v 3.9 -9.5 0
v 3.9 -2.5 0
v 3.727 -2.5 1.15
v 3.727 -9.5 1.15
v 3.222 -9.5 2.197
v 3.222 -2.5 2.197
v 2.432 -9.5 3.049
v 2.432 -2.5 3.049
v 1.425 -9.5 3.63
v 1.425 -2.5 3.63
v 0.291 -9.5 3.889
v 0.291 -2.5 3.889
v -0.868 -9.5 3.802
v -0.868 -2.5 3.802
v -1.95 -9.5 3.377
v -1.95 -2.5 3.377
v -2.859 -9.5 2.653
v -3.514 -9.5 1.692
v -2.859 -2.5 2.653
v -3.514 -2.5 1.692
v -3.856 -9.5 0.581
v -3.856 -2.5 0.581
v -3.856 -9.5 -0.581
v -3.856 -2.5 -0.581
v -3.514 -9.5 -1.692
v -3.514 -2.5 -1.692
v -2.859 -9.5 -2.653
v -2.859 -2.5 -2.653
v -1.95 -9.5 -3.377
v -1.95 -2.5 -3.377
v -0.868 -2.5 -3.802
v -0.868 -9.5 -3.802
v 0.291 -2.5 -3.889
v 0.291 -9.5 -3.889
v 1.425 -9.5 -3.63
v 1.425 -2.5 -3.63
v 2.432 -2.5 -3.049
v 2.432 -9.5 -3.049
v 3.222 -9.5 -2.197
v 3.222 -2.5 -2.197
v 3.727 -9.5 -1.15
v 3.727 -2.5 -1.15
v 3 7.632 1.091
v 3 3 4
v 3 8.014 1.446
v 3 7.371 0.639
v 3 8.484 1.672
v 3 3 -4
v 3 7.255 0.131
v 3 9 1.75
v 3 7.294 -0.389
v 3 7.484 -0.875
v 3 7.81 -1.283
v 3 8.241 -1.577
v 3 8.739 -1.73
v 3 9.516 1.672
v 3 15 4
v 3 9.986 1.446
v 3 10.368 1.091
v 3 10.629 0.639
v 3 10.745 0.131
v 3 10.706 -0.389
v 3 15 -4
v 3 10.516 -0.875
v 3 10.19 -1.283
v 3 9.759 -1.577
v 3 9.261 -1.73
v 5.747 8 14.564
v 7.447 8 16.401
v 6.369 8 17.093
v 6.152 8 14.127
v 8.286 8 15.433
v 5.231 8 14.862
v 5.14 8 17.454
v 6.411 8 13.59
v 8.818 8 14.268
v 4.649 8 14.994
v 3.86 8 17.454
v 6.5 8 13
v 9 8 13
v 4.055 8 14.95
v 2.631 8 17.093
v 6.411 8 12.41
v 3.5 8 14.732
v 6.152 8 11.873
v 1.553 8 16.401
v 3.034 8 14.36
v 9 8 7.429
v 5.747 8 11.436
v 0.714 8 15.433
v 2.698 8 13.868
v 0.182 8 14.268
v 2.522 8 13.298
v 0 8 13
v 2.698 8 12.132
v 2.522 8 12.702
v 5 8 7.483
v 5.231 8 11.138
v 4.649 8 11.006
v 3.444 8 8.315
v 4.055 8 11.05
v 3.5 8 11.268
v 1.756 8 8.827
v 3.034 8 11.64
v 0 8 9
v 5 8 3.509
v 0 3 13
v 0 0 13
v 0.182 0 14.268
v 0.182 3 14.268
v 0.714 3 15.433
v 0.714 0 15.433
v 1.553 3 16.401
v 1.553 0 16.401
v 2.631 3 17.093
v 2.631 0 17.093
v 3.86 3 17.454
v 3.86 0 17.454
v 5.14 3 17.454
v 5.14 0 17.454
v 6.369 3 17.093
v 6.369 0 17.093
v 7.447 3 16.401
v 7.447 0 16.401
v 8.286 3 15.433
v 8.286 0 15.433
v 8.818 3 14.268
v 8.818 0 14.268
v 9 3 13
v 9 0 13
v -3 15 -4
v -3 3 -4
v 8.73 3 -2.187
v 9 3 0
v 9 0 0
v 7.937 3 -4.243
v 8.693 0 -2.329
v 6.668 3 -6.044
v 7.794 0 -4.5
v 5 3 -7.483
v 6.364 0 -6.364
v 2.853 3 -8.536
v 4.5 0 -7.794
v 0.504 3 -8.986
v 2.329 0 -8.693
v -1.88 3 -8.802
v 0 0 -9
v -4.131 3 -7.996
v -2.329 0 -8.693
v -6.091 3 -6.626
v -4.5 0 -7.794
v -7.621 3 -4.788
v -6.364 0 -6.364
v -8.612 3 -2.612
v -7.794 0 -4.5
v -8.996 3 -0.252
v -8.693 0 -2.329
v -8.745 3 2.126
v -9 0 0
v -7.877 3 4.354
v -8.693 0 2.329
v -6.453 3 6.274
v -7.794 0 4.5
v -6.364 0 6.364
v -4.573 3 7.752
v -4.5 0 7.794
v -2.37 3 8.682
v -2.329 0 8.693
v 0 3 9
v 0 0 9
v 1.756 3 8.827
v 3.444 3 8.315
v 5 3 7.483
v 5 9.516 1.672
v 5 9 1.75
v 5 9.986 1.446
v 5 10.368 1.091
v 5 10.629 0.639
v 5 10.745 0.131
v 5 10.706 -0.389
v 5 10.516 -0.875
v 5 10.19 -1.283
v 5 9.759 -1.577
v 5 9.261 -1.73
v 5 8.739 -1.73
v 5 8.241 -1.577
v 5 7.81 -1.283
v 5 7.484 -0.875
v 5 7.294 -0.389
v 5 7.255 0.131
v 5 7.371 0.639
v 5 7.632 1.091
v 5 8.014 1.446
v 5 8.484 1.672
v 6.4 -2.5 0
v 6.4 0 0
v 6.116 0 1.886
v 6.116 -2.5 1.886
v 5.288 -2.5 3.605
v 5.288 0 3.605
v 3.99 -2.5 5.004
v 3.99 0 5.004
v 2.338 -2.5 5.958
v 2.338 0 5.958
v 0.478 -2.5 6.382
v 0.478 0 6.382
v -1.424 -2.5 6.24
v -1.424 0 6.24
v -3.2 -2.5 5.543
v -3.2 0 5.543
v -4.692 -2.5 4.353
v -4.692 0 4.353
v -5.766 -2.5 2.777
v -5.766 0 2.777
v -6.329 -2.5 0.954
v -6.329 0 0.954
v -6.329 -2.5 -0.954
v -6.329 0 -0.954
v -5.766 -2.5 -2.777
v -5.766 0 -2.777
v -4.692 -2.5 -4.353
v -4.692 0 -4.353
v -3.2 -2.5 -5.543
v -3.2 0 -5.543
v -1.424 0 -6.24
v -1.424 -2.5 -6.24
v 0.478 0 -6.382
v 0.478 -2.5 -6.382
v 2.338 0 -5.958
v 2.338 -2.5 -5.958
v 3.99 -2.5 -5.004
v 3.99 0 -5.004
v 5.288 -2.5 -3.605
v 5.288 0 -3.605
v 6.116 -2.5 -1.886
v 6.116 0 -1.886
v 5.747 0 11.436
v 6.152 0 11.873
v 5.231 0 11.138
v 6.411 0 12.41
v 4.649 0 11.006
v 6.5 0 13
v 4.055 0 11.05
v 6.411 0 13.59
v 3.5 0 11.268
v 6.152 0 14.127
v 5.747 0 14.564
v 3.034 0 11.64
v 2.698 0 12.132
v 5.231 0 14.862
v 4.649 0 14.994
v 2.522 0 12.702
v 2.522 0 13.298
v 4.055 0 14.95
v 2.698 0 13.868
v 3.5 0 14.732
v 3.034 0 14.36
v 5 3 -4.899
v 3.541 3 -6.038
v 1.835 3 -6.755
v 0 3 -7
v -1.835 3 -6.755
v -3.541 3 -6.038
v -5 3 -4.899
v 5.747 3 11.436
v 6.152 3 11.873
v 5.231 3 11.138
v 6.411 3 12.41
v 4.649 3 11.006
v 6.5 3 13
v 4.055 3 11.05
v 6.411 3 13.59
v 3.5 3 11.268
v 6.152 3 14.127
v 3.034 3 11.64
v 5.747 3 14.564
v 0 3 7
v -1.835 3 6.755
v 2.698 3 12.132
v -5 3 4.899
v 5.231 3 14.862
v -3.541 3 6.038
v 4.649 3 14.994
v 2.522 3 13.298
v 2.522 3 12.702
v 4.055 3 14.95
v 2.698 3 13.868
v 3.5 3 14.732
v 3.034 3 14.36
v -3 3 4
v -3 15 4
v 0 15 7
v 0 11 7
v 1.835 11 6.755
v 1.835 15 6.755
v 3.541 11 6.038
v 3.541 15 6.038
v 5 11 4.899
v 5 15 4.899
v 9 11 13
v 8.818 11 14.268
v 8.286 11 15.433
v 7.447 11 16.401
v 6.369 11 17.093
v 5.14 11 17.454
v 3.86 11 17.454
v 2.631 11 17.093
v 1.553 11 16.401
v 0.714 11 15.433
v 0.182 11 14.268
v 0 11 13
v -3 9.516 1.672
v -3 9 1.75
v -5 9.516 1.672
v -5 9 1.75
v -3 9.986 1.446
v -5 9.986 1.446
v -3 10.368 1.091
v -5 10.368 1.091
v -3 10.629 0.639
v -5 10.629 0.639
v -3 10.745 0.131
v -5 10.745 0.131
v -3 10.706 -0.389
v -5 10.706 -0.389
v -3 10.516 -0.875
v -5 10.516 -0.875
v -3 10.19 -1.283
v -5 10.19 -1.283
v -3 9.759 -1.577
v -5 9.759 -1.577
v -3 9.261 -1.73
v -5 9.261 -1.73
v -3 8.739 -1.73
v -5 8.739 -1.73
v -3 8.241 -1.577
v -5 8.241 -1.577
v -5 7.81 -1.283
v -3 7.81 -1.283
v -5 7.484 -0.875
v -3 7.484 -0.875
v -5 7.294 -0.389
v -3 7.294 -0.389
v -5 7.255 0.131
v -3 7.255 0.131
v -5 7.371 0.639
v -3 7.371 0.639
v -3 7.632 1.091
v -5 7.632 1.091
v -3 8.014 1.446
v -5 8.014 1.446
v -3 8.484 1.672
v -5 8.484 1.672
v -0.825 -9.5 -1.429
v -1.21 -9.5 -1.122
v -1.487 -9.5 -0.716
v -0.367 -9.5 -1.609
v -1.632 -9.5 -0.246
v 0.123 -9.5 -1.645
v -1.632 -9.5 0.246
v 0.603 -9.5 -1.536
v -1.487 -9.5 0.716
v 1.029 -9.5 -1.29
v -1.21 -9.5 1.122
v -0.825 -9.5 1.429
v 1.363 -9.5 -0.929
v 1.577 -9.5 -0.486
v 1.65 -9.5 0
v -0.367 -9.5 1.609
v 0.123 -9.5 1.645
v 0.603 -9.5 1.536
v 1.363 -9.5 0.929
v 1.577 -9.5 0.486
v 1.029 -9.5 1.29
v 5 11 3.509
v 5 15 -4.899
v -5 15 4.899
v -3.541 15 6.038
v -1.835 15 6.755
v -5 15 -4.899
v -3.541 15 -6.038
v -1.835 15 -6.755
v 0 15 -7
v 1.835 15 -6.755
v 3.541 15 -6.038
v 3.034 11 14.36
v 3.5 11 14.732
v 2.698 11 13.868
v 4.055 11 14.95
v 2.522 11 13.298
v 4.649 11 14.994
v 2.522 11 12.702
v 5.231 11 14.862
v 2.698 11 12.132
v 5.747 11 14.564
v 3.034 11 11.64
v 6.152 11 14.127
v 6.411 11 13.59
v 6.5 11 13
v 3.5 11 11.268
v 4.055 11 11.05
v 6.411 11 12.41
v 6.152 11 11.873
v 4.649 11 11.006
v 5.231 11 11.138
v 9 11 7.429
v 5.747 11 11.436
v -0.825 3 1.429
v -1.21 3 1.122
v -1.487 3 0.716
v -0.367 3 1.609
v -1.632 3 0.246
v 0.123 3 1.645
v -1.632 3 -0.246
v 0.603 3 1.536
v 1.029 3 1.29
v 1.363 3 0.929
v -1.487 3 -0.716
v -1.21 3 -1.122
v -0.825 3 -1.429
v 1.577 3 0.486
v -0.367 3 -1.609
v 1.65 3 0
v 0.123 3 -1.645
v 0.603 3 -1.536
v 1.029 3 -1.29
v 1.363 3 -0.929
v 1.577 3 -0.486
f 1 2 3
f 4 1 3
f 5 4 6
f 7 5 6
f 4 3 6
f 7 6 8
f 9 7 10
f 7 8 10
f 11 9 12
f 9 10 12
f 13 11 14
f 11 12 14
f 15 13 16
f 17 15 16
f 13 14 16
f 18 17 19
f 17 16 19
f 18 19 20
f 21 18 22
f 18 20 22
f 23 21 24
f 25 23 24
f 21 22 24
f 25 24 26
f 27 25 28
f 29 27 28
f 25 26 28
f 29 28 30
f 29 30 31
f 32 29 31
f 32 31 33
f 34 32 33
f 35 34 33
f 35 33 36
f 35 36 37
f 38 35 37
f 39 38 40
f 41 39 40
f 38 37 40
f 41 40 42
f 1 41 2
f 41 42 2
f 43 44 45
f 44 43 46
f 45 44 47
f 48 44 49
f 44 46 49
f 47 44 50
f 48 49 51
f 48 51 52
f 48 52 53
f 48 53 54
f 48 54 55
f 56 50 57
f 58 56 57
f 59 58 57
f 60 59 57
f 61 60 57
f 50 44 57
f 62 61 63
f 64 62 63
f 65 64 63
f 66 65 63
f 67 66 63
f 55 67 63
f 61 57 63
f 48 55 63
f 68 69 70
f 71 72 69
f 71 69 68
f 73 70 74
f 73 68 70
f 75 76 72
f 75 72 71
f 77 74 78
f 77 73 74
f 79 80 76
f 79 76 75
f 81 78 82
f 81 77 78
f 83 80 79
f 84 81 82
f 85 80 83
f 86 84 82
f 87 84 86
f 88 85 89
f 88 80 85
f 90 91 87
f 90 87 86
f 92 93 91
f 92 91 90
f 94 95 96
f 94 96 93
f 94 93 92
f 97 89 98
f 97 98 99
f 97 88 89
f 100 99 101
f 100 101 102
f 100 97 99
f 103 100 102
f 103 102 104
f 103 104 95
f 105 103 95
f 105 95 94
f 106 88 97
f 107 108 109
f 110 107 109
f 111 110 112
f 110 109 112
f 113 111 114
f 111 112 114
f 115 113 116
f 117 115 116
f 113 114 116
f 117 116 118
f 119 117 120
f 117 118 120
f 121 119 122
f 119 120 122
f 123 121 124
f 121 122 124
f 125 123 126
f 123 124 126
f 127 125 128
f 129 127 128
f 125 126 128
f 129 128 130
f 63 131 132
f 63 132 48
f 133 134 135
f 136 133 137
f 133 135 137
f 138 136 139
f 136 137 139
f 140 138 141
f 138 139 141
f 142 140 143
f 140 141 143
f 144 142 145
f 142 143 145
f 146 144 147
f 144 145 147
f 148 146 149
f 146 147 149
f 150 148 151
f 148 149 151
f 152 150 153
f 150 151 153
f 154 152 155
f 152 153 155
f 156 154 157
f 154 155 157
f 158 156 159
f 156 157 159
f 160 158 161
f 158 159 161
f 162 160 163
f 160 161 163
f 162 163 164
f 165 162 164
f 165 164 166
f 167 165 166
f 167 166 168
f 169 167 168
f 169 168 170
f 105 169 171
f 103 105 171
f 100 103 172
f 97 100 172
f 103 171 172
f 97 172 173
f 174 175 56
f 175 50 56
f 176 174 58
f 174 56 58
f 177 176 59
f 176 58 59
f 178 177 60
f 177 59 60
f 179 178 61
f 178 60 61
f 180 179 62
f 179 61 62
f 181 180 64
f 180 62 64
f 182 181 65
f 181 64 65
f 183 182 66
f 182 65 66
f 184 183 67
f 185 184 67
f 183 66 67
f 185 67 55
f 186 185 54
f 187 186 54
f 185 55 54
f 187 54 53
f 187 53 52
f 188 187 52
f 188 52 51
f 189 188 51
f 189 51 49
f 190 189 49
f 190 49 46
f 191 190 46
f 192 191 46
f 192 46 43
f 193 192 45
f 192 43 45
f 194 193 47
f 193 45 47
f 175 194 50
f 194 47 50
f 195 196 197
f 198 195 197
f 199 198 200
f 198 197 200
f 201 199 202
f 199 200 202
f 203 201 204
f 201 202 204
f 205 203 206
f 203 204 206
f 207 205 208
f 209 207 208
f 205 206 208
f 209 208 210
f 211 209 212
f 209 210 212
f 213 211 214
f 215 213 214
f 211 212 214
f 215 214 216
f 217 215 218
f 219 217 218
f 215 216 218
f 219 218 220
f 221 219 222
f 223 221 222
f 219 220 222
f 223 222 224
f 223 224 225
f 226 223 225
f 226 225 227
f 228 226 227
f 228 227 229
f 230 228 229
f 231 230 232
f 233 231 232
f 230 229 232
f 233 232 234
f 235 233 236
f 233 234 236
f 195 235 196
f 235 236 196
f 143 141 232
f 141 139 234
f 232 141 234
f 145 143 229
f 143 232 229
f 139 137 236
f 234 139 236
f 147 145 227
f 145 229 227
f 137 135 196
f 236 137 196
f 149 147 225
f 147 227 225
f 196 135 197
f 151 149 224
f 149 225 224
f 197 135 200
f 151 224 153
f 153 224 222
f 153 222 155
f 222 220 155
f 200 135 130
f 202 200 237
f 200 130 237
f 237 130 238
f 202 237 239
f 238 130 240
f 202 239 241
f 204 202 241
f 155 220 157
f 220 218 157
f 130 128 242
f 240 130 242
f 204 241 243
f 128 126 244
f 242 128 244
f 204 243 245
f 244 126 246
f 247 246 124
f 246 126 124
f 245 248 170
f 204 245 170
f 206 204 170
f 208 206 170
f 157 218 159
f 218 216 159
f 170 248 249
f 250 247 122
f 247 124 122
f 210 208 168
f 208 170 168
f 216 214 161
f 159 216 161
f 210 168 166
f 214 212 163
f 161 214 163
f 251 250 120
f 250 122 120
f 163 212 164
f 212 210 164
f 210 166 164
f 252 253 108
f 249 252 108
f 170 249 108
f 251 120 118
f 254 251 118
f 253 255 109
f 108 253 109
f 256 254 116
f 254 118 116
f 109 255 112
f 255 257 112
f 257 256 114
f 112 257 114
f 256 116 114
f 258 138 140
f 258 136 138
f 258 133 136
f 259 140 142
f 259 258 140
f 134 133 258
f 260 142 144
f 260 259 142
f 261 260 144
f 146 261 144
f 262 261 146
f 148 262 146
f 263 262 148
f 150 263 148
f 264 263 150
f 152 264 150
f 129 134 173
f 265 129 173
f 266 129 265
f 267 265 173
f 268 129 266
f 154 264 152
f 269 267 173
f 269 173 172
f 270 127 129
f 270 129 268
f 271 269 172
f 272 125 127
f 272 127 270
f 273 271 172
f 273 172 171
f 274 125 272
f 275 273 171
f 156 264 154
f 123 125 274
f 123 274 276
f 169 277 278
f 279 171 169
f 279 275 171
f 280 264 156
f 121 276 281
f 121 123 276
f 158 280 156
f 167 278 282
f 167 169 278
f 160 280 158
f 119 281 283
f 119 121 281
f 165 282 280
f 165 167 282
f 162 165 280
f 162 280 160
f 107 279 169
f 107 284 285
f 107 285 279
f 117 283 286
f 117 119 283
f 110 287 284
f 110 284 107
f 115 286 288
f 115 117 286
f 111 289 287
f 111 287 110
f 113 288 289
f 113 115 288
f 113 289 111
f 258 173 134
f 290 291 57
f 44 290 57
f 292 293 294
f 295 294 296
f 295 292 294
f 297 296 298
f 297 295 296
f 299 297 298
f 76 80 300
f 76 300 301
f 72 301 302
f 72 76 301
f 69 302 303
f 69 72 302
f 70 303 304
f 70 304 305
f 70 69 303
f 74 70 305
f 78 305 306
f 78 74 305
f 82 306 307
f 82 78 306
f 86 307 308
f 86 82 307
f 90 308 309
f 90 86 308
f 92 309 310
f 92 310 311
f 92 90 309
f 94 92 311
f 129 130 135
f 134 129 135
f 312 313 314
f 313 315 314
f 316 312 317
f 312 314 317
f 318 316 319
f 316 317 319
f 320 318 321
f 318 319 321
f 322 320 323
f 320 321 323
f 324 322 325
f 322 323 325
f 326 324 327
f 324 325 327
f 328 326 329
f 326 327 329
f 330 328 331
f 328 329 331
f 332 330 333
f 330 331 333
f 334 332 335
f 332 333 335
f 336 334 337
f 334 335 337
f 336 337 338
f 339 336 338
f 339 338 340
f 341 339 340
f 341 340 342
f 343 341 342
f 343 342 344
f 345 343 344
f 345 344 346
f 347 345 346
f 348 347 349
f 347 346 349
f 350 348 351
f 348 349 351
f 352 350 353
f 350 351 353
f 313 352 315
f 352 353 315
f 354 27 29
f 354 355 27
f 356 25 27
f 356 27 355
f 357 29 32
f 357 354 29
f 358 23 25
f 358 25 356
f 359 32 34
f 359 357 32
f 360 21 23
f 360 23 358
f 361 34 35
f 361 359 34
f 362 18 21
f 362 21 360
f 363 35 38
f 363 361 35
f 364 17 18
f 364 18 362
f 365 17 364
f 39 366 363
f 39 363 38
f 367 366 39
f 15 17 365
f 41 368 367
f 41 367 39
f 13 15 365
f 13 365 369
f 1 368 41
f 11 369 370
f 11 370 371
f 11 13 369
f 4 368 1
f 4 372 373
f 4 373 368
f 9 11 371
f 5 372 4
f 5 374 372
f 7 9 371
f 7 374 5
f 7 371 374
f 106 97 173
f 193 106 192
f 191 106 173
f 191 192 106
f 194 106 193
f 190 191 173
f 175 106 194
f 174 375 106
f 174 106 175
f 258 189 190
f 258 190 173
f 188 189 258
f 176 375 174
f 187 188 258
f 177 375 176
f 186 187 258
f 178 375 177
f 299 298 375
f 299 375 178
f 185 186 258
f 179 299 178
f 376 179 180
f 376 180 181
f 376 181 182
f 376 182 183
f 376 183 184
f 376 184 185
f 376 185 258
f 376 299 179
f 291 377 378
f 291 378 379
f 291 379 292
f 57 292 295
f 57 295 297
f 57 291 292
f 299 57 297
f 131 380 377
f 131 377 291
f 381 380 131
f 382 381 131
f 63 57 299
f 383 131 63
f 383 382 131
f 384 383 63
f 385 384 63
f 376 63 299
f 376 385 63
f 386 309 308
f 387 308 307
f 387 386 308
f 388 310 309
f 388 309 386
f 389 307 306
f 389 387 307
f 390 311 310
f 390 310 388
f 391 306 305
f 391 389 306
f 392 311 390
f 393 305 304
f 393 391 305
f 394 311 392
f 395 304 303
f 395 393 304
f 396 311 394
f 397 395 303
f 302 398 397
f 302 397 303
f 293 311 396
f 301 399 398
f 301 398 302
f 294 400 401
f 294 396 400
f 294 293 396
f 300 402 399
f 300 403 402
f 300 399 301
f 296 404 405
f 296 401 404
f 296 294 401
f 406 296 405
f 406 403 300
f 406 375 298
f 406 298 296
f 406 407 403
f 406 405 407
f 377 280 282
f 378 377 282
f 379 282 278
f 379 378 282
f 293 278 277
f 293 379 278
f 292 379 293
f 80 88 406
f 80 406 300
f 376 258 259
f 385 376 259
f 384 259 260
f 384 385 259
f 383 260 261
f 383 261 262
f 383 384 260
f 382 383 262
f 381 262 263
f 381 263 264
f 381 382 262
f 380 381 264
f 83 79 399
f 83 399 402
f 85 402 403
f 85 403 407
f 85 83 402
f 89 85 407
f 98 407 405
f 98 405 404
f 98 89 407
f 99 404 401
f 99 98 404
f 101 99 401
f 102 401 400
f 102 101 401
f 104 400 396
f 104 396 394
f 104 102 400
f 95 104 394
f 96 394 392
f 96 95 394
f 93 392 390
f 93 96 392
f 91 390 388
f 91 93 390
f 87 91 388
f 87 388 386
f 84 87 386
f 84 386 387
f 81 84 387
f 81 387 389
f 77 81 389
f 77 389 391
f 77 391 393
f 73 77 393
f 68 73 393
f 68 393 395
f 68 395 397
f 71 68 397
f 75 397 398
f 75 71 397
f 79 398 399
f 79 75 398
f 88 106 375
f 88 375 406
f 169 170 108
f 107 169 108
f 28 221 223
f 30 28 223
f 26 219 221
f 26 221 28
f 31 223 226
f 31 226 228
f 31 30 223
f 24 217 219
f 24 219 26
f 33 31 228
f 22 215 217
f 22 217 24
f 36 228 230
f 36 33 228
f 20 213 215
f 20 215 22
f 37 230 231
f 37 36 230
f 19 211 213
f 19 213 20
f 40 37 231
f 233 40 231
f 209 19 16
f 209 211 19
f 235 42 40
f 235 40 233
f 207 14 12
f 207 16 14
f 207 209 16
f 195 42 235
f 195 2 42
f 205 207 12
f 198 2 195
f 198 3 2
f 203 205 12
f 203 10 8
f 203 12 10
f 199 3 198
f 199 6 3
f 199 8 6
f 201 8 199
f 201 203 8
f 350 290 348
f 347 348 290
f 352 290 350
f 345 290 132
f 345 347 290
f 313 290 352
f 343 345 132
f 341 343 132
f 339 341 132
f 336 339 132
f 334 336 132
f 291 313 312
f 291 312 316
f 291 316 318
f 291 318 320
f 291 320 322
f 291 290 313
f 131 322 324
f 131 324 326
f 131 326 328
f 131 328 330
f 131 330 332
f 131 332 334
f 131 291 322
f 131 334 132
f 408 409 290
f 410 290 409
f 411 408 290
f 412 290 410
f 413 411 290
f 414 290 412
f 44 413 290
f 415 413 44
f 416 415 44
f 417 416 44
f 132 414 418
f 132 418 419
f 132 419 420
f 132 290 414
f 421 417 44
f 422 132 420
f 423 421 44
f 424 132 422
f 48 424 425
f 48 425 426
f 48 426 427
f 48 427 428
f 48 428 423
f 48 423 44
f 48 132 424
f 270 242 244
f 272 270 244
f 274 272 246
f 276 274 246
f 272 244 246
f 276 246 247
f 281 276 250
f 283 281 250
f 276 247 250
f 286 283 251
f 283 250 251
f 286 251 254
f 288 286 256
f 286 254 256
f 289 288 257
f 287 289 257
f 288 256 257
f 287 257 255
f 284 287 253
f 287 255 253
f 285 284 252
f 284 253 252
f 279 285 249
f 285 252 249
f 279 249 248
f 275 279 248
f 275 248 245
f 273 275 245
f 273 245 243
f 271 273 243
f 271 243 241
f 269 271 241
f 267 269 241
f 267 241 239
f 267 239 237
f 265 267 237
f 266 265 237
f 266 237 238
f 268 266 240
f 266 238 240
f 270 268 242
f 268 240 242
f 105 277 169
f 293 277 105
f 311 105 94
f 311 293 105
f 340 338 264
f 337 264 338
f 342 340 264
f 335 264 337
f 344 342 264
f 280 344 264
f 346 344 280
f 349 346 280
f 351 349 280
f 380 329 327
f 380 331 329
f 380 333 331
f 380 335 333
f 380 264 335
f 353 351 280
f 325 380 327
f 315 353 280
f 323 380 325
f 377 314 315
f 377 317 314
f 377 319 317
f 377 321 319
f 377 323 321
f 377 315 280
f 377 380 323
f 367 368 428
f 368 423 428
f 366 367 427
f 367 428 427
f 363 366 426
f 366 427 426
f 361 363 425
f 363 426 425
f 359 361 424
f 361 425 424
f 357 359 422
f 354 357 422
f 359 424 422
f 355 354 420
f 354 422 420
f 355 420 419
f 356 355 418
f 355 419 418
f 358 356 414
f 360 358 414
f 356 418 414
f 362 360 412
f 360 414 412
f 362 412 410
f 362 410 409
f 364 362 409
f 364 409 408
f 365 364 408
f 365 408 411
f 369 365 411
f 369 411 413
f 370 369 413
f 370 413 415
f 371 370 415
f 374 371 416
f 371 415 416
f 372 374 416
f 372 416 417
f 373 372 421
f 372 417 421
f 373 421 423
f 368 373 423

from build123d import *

# Parameters (mm, degrees)
SKETCH1_R               = 9
MAIN_BODY_DEPTH         = 15
SKETCH4_R               = 6.4
BOSS_EXTRUDE3_DEPTH     = 2.5
SKETCH5_R               = 3.9
BOSS_EXTRUDE4_DEPTH     = 7
SKETCH9_R               = 2
ARM_ATTTACH_DEPTH       = 3
SKETCH11_W              = 18
SKETCH11_H              = 12
CUT_EXTRUDE1_DEPTH      = 5
SKETCH13_R              = 2
ARM_ATTACH_DEPTH        = 3
CUT_EXTRUDE5_DEPTH      = 12
SKETCH14_W              = 6
SKETCH14_H              = 8
BLADE_HOLE_DEPTH        = 12
SKETCH21_W              = 15
SKETCH21_H              = 12
FACE_CUT_DEPTH          = 10
SKETCH23_R              = 9
SKETCH23_R_2            = 7
CUT_EXTRUDE8_DEPTH      = 4
SKETCH24_R              = 1.75
SCREW_HOLE_DEPTH        = 15
SKETCH26_R              = 1.65
CUT_EXTRUDE9_DEPTH      = 16
CUT_EXTRUDE9_DEPTH_BACK = 10.5


with BuildPart() as part:
    # Sketch1 → main body (new body)
    with BuildSketch(Plane(origin=(0, 0, 0), x_dir=(1, 0, 0), z_dir=(0, 1, 0))):
        Circle(SKETCH1_R)
    extrude(amount=MAIN_BODY_DEPTH)

    # Sketch4 → Boss-Extrude3 (add)
    with BuildSketch(Plane.XZ):
        Circle(SKETCH4_R)
    extrude(amount=BOSS_EXTRUDE3_DEPTH)

    # Sketch5 → Boss-Extrude4 (add)
    with BuildSketch(Plane.XZ.offset(2.5)):
        Circle(SKETCH5_R)
    extrude(amount=BOSS_EXTRUDE4_DEPTH)

    # Sketch9 → arm atttach (add)
    with BuildSketch(Plane.XZ):
        with BuildLine():
            Line((0, 9), (0, 13))
            ThreePointArc((0, 13), (4.5, 17.5), (9, 13))
            Line((9, 13), (9, 0))
            ThreePointArc((9, 0), (6.363961031, 6.363961031), (0, 9))
        make_face()
        with Locations((4.5, 13)):
            Circle(SKETCH9_R, mode=Mode.SUBTRACT)
    extrude(amount=-ARM_ATTTACH_DEPTH)

    # Sketch11 → Cut-Extrude1 (cut)
    with BuildSketch(Plane(origin=(5, 0, 0), x_dir=(0, 0, -1), z_dir=(1, 0, 0))):
        with Locations((0, 9)):
            Rectangle(SKETCH11_W, SKETCH11_H)
    extrude(amount=CUT_EXTRUDE1_DEPTH, mode=Mode.SUBTRACT)

    # Sketch13 → arm attach (add)
    with BuildSketch(Plane(origin=(0, 8, 0), x_dir=(1, 0, 0), z_dir=(0, 1, 0))):
        with BuildLine():
            Line((0, -13), (0, -9))
            ThreePointArc((0, -9), (2.61248608, -8.61248608), (5, -7.483314774))
            Line((5, -7.483314774), (5, -3.50923953))
            Line((5, -3.50923953), (9, -7.42923953))
            Line((9, -7.42923953), (9, -13))
            ThreePointArc((9, -13), (4.5, -17.5), (0, -13))
        make_face()
        with Locations((4.5, -13)):
            Circle(SKETCH13_R, mode=Mode.SUBTRACT)
    extrude(amount=ARM_ATTACH_DEPTH)

    # Sketch19 → Cut-Extrude5 (cut)
    with BuildSketch(Plane(origin=(0, 15, 0), x_dir=(1, 0, 0), z_dir=(0, 1, 0))):
        with BuildLine():
            Line((0, -7), (0, -9))
            ThreePointArc((0, -9), (-3.939351121, 8.092064801), (7.083885455, -5.551447276))
            Line((7.083885455, -5.551447276), (5.644138479, -4.14049524))
            ThreePointArc((5.644138479, -4.14049524), (-3.163584464, 6.244336101), (0, -7))
        make_face()
    extrude(amount=-CUT_EXTRUDE5_DEPTH, mode=Mode.SUBTRACT)

    # Sketch14 → blade hole (cut)
    with BuildSketch(Plane(origin=(0, 15, 0), x_dir=(1, 0, 0), z_dir=(0, 1, 0))):
        Rectangle(SKETCH14_W, SKETCH14_H)
    extrude(amount=-BLADE_HOLE_DEPTH, mode=Mode.SUBTRACT)

    # Sketch21 → face cut (cut)
    with BuildSketch(Plane.ZY.offset(5)):
        with Locations((0, 9)):
            Rectangle(SKETCH21_W, SKETCH21_H)
    extrude(amount=FACE_CUT_DEPTH, mode=Mode.SUBTRACT)

    # Sketch23 → Cut-Extrude8 (cut)
    with BuildSketch(Plane(origin=(0, 15, 0), x_dir=(1, 0, 0), z_dir=(0, 1, 0))):
        Circle(SKETCH23_R)
        Circle(SKETCH23_R_2, mode=Mode.SUBTRACT)
    extrude(amount=-CUT_EXTRUDE8_DEPTH, mode=Mode.SUBTRACT)

    # Sketch24 → screw hole (cut, symmetric)
    with BuildSketch(Plane.ZY.offset(5)):
        with Locations((0, 9)):
            Circle(SKETCH24_R)
    extrude(amount=SCREW_HOLE_DEPTH, both=True, mode=Mode.SUBTRACT)

    # Sketch26 → Cut-Extrude9 (cut, two sides)
    with BuildSketch(Plane(origin=(0, 0, 0), x_dir=(1, 0, 0), z_dir=(0, 1, 0))) as cut_extrude9_sk:
        Circle(SKETCH26_R)
    extrude(amount=CUT_EXTRUDE9_DEPTH, mode=Mode.SUBTRACT)
    extrude(cut_extrude9_sk.sketch, amount=-CUT_EXTRUDE9_DEPTH_BACK, mode=Mode.SUBTRACT)


solid = part.part
